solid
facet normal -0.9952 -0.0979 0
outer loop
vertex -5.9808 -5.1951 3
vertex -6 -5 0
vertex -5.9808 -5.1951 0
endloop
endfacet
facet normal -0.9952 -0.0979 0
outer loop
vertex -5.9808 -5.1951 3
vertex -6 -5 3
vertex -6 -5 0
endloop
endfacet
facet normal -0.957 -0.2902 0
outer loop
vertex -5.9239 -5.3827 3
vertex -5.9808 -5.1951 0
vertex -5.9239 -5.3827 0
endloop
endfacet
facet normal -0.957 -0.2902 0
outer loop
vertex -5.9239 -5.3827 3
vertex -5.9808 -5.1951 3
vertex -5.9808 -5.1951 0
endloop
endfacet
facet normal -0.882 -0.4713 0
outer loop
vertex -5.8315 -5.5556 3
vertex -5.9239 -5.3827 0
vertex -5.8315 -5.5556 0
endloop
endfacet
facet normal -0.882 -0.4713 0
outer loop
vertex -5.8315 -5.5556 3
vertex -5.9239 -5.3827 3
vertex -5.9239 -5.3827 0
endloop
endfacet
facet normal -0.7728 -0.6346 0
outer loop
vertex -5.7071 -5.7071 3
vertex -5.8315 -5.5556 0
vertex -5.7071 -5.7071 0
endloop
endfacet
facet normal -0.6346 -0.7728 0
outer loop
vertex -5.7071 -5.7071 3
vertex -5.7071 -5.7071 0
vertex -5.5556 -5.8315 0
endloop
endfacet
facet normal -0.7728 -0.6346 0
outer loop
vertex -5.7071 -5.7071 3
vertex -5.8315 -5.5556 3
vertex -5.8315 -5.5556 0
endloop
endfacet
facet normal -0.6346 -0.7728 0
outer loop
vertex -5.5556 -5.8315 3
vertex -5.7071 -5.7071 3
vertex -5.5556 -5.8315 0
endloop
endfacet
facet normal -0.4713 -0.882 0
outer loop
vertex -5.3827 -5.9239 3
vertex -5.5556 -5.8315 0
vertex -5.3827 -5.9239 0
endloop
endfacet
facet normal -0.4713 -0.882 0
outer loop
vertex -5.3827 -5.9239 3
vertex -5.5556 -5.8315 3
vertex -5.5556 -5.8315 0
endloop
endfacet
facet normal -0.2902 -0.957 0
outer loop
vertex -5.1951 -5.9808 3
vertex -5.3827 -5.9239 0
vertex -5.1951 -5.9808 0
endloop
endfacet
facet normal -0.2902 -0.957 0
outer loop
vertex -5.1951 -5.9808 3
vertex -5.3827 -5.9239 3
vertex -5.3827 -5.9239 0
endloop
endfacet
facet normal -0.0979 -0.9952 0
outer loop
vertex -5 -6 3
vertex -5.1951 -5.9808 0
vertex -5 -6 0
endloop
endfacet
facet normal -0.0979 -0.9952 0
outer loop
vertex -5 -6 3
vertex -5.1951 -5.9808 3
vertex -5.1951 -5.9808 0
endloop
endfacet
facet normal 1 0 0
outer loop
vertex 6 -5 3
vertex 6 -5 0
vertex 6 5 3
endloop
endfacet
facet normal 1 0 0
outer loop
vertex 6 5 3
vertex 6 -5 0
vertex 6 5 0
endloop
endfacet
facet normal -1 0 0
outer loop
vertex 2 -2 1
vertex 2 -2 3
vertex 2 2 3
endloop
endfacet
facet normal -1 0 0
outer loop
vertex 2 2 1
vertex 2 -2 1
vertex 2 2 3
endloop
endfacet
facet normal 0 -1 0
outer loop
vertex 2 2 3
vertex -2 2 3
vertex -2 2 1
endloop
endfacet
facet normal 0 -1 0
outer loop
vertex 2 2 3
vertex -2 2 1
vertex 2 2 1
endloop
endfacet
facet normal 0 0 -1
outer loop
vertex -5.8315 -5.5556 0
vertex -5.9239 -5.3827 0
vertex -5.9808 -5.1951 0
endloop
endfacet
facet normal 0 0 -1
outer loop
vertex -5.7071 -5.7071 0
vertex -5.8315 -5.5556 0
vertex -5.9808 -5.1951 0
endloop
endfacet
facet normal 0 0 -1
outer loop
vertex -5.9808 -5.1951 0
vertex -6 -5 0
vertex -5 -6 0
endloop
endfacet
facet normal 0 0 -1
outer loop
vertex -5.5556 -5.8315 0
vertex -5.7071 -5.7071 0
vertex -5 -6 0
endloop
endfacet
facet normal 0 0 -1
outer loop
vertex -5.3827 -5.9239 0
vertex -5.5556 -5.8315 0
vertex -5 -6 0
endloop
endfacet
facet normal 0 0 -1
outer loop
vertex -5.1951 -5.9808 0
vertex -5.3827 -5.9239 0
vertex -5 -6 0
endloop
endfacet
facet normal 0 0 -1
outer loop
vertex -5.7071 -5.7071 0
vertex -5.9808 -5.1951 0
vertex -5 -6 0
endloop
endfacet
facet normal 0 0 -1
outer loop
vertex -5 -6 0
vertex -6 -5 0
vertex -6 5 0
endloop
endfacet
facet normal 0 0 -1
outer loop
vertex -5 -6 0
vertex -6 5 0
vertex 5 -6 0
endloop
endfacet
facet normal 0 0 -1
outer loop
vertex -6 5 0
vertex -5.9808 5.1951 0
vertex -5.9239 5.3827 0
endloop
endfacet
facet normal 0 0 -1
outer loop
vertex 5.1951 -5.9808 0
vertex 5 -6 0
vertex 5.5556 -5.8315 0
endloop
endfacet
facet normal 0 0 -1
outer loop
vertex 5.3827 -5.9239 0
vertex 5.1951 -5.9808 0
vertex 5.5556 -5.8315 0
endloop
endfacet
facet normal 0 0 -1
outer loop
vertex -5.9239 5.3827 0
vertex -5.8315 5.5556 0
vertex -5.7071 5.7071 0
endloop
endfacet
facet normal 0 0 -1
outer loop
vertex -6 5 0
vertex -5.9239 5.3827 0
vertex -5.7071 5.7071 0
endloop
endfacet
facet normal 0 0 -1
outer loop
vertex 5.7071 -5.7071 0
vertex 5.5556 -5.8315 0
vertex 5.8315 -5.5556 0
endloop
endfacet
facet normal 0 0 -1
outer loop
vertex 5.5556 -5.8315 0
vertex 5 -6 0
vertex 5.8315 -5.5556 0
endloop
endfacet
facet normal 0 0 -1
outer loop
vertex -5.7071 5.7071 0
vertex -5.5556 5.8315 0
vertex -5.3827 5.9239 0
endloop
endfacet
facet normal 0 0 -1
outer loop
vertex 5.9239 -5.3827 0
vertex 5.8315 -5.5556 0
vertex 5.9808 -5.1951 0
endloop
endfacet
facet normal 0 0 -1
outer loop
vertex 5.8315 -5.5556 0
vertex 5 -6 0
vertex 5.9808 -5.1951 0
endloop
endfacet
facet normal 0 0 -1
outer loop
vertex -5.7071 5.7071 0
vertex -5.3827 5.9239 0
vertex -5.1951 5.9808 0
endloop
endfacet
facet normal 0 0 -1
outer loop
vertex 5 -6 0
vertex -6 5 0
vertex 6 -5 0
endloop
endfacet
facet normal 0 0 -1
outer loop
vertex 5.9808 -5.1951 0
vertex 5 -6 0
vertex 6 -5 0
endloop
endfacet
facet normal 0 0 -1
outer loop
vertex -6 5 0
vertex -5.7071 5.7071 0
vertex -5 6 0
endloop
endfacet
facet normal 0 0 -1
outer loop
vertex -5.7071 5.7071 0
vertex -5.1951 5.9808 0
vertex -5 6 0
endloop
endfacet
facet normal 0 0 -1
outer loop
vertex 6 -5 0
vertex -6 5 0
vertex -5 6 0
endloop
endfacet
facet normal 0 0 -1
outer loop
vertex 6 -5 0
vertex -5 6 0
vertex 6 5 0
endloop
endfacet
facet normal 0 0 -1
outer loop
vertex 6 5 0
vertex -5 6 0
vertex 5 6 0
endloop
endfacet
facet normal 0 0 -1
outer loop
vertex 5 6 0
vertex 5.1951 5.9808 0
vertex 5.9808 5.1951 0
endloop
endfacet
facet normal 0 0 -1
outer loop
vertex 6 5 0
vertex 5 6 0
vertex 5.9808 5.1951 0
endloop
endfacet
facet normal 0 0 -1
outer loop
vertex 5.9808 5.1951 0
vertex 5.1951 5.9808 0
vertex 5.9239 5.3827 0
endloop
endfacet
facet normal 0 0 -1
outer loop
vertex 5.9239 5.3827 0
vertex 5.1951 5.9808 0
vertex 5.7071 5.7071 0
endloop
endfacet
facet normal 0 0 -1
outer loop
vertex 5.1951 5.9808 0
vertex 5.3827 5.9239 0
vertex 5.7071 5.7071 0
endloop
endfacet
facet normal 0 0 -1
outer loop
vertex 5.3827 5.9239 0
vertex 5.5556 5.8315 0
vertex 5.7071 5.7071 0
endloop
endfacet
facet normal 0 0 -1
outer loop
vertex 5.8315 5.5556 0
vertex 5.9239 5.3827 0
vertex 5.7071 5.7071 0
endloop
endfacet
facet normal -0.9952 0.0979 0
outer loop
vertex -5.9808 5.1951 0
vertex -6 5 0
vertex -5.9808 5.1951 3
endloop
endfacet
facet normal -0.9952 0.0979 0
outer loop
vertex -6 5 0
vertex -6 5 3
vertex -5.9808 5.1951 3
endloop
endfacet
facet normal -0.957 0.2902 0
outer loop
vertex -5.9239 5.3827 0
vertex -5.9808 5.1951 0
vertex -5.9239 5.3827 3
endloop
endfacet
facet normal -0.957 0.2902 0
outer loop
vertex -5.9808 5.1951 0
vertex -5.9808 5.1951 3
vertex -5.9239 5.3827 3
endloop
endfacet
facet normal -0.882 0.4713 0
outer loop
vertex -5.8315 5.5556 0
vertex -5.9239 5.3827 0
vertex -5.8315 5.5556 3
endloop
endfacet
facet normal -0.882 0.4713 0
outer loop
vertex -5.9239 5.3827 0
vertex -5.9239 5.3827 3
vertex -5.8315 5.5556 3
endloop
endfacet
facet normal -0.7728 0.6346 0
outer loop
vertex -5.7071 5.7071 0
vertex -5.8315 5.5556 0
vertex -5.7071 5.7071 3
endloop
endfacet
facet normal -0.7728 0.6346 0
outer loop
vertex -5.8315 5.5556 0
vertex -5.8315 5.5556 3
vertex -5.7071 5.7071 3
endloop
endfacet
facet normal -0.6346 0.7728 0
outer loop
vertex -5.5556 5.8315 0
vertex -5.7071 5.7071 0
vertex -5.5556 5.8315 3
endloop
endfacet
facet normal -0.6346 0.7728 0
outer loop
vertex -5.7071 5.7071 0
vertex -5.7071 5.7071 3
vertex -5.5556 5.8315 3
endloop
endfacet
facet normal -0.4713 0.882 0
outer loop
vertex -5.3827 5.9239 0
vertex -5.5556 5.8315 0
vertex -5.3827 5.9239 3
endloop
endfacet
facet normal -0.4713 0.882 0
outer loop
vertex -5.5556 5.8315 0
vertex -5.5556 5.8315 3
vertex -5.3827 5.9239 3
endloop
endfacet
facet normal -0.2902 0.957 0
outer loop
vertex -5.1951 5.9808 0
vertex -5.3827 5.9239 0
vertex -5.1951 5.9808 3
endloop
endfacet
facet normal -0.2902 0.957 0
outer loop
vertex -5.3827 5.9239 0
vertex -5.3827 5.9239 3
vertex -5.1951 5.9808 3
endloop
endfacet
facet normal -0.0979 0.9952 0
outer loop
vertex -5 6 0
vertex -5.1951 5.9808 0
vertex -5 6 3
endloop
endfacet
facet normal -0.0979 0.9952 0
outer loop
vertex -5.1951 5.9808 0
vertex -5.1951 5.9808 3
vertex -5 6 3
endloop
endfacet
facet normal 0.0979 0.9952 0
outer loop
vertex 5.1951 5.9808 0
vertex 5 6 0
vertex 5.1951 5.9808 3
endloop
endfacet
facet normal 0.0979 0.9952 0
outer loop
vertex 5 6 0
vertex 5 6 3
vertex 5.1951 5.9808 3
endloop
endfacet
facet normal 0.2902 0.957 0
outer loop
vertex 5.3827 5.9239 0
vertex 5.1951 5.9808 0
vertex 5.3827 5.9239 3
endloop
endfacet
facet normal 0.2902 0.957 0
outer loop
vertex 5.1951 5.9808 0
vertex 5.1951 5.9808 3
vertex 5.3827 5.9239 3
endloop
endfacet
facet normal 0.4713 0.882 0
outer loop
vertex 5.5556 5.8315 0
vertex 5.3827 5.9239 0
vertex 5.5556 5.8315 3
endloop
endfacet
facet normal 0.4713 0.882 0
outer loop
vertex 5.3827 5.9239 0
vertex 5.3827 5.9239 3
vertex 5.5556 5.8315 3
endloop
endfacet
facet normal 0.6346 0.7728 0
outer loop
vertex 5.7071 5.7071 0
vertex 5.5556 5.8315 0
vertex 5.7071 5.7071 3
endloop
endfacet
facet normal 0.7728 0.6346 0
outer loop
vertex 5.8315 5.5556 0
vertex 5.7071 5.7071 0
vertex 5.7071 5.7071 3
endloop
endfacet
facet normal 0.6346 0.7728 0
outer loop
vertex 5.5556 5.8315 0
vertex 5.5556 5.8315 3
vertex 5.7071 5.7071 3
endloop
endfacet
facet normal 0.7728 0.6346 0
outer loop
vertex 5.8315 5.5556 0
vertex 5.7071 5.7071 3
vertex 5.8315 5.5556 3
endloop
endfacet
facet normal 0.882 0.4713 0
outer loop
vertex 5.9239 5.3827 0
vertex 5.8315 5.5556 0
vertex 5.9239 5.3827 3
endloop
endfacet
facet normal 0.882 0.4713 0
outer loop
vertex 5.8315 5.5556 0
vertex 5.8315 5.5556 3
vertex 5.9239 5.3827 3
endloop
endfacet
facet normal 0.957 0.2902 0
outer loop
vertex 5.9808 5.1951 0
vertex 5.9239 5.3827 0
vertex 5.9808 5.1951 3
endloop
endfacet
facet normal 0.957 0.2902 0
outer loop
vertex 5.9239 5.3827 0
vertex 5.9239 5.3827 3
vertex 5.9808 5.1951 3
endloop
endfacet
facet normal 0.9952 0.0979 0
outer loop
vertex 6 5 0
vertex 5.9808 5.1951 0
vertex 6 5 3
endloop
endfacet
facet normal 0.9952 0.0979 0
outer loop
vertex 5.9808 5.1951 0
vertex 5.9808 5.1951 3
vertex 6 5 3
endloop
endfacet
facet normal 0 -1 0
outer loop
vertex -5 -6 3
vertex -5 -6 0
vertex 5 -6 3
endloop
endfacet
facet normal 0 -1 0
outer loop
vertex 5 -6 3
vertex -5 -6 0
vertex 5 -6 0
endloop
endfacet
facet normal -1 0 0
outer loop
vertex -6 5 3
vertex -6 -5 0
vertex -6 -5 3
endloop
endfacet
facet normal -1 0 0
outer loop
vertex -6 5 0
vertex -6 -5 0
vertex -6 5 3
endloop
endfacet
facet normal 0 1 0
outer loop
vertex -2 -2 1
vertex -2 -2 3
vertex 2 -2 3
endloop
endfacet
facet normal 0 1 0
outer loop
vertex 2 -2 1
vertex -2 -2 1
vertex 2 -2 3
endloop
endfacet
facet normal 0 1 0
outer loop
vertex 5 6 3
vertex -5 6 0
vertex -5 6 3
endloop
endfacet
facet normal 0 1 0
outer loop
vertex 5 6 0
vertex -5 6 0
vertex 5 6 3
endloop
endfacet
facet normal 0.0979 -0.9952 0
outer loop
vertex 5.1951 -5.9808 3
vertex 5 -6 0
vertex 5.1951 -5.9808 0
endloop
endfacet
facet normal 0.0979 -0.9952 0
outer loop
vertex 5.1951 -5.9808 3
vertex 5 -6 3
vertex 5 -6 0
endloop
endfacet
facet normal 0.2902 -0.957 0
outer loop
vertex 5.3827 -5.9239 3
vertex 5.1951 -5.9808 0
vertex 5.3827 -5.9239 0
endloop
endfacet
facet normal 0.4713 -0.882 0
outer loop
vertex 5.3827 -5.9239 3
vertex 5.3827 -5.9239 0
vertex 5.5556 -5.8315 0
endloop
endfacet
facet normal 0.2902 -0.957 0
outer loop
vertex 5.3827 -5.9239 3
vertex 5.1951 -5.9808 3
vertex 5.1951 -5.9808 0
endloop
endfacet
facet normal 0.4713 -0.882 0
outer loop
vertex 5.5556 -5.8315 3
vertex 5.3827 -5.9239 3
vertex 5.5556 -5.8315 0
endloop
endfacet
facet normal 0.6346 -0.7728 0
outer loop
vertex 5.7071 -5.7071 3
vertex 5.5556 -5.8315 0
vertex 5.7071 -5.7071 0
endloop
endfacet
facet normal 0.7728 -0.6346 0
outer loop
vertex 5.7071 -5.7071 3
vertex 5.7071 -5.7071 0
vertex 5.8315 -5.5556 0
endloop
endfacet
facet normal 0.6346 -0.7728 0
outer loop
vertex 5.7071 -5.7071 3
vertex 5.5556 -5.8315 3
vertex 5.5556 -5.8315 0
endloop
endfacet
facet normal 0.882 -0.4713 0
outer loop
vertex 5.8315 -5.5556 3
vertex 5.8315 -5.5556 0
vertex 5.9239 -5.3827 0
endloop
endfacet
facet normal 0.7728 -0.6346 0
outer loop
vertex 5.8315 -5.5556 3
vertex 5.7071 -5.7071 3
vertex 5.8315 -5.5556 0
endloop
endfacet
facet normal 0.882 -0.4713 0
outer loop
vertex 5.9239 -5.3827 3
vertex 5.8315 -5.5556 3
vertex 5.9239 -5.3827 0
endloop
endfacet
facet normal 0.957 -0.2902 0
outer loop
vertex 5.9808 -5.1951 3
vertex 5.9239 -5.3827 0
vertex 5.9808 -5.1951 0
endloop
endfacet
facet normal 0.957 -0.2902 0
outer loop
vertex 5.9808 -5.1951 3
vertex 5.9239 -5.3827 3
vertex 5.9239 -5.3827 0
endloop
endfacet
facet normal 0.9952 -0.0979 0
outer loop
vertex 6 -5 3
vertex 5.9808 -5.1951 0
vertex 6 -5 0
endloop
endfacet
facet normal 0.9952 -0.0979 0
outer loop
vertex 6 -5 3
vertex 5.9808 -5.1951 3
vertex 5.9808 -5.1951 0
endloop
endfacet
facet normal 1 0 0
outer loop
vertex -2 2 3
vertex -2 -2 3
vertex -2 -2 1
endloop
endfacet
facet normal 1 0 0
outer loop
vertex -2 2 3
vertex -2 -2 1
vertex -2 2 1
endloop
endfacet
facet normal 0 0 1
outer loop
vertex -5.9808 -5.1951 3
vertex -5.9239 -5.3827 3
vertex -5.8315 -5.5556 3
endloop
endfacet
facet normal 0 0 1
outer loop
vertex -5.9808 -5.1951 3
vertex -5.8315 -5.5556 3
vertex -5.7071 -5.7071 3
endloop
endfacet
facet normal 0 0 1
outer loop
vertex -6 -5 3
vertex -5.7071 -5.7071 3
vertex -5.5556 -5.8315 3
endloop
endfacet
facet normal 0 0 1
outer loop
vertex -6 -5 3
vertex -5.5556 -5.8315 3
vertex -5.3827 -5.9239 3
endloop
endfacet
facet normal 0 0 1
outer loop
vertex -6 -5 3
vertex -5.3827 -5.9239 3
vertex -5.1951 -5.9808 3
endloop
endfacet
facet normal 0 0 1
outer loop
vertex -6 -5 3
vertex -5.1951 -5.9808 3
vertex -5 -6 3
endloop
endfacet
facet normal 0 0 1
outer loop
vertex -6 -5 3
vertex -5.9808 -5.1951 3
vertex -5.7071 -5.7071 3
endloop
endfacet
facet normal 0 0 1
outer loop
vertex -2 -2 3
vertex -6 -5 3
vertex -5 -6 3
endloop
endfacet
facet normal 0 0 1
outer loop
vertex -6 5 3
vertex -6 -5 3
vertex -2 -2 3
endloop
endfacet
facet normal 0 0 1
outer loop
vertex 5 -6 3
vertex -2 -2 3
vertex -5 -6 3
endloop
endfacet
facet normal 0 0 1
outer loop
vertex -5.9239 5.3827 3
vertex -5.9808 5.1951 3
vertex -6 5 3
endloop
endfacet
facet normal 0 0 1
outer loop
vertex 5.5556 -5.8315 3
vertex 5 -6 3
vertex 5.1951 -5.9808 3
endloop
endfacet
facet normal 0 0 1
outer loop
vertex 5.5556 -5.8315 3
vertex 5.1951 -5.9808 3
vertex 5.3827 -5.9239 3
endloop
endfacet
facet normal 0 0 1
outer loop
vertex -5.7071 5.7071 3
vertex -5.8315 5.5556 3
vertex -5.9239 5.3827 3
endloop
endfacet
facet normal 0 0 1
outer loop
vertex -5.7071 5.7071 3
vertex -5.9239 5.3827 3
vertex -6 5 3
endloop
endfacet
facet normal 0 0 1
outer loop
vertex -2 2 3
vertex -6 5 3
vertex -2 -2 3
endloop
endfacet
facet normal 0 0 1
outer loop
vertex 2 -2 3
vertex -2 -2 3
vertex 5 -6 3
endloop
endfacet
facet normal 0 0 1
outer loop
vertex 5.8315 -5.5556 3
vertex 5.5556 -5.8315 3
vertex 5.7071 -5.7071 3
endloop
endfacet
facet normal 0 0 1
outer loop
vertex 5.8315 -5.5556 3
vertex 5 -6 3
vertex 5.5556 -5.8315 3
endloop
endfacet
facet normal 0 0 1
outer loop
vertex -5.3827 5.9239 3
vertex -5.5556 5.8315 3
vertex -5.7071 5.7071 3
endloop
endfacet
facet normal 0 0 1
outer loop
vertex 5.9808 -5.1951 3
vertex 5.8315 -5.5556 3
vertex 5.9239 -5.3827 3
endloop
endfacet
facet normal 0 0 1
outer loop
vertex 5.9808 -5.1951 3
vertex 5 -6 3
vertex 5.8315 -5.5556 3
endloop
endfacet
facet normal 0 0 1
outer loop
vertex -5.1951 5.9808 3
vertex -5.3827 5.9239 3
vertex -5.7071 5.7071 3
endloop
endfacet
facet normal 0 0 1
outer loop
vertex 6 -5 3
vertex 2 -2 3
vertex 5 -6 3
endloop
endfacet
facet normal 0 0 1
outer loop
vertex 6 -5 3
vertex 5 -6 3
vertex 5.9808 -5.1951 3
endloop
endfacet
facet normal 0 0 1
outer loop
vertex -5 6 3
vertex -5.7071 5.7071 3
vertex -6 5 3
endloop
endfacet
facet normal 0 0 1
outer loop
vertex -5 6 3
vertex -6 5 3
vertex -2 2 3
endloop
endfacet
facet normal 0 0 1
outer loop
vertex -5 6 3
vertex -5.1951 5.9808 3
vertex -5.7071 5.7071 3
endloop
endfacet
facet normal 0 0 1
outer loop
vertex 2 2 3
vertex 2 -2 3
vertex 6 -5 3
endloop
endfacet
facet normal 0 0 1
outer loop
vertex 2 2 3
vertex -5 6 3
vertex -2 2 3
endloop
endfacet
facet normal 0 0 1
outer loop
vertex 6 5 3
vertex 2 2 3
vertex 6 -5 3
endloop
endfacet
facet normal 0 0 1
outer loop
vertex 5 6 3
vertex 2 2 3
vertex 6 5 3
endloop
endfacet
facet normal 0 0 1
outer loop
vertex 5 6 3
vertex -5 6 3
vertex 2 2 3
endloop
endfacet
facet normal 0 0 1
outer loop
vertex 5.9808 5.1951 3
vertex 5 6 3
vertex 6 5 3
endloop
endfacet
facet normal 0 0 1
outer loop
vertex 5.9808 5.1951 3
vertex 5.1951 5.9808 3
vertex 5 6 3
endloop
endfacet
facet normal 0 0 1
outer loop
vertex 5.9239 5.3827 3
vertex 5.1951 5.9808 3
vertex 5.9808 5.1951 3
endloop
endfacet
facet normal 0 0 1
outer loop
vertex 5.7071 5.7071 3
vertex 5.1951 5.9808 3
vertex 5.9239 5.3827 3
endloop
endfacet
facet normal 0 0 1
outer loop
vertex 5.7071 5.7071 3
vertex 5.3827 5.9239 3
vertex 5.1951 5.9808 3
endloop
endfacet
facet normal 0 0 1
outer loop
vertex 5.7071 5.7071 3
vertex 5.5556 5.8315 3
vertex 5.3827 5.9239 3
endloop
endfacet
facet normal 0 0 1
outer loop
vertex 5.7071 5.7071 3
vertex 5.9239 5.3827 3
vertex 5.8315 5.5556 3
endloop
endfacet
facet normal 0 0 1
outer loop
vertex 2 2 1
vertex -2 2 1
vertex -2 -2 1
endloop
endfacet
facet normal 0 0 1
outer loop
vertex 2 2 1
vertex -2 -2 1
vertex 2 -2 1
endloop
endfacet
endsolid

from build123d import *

# Parameters (mm, degrees)
SKETCH_1_W          = 12
SKETCH_1_H          = 12
EXTRUDE_1_DEPTH     = 3
SKETCH_2_W          = 4
SKETCH_2_H          = 4
CUT_EXTRUDE_1_DEPTH = 2
FILLET_1_R          = 1


with BuildPart() as part:
    # 스케치1 → 보스-돌출1 (new body)
    with BuildSketch(Plane.XY):
        Rectangle(SKETCH_1_W, SKETCH_1_H)
    extrude(amount=EXTRUDE_1_DEPTH)

    # 스케치2 → 컷-돌출1 (cut)
    with BuildSketch(Plane.XY.offset(3)):
        Rectangle(SKETCH_2_W, SKETCH_2_H)
    extrude(amount=-CUT_EXTRUDE_1_DEPTH, mode=Mode.SUBTRACT)

    # 필렛1
    fillet_1_edges = [part.edges().sort_by_distance(p)[0] for p in [
        (6, -6, 1.5),
        (-6, -6, 1.5),
        (-6, 6, 1.5),
        (6, 6, 1.5),
    ]]
    fillet(fillet_1_edges, radius=FILLET_1_R)


solid = part.part
